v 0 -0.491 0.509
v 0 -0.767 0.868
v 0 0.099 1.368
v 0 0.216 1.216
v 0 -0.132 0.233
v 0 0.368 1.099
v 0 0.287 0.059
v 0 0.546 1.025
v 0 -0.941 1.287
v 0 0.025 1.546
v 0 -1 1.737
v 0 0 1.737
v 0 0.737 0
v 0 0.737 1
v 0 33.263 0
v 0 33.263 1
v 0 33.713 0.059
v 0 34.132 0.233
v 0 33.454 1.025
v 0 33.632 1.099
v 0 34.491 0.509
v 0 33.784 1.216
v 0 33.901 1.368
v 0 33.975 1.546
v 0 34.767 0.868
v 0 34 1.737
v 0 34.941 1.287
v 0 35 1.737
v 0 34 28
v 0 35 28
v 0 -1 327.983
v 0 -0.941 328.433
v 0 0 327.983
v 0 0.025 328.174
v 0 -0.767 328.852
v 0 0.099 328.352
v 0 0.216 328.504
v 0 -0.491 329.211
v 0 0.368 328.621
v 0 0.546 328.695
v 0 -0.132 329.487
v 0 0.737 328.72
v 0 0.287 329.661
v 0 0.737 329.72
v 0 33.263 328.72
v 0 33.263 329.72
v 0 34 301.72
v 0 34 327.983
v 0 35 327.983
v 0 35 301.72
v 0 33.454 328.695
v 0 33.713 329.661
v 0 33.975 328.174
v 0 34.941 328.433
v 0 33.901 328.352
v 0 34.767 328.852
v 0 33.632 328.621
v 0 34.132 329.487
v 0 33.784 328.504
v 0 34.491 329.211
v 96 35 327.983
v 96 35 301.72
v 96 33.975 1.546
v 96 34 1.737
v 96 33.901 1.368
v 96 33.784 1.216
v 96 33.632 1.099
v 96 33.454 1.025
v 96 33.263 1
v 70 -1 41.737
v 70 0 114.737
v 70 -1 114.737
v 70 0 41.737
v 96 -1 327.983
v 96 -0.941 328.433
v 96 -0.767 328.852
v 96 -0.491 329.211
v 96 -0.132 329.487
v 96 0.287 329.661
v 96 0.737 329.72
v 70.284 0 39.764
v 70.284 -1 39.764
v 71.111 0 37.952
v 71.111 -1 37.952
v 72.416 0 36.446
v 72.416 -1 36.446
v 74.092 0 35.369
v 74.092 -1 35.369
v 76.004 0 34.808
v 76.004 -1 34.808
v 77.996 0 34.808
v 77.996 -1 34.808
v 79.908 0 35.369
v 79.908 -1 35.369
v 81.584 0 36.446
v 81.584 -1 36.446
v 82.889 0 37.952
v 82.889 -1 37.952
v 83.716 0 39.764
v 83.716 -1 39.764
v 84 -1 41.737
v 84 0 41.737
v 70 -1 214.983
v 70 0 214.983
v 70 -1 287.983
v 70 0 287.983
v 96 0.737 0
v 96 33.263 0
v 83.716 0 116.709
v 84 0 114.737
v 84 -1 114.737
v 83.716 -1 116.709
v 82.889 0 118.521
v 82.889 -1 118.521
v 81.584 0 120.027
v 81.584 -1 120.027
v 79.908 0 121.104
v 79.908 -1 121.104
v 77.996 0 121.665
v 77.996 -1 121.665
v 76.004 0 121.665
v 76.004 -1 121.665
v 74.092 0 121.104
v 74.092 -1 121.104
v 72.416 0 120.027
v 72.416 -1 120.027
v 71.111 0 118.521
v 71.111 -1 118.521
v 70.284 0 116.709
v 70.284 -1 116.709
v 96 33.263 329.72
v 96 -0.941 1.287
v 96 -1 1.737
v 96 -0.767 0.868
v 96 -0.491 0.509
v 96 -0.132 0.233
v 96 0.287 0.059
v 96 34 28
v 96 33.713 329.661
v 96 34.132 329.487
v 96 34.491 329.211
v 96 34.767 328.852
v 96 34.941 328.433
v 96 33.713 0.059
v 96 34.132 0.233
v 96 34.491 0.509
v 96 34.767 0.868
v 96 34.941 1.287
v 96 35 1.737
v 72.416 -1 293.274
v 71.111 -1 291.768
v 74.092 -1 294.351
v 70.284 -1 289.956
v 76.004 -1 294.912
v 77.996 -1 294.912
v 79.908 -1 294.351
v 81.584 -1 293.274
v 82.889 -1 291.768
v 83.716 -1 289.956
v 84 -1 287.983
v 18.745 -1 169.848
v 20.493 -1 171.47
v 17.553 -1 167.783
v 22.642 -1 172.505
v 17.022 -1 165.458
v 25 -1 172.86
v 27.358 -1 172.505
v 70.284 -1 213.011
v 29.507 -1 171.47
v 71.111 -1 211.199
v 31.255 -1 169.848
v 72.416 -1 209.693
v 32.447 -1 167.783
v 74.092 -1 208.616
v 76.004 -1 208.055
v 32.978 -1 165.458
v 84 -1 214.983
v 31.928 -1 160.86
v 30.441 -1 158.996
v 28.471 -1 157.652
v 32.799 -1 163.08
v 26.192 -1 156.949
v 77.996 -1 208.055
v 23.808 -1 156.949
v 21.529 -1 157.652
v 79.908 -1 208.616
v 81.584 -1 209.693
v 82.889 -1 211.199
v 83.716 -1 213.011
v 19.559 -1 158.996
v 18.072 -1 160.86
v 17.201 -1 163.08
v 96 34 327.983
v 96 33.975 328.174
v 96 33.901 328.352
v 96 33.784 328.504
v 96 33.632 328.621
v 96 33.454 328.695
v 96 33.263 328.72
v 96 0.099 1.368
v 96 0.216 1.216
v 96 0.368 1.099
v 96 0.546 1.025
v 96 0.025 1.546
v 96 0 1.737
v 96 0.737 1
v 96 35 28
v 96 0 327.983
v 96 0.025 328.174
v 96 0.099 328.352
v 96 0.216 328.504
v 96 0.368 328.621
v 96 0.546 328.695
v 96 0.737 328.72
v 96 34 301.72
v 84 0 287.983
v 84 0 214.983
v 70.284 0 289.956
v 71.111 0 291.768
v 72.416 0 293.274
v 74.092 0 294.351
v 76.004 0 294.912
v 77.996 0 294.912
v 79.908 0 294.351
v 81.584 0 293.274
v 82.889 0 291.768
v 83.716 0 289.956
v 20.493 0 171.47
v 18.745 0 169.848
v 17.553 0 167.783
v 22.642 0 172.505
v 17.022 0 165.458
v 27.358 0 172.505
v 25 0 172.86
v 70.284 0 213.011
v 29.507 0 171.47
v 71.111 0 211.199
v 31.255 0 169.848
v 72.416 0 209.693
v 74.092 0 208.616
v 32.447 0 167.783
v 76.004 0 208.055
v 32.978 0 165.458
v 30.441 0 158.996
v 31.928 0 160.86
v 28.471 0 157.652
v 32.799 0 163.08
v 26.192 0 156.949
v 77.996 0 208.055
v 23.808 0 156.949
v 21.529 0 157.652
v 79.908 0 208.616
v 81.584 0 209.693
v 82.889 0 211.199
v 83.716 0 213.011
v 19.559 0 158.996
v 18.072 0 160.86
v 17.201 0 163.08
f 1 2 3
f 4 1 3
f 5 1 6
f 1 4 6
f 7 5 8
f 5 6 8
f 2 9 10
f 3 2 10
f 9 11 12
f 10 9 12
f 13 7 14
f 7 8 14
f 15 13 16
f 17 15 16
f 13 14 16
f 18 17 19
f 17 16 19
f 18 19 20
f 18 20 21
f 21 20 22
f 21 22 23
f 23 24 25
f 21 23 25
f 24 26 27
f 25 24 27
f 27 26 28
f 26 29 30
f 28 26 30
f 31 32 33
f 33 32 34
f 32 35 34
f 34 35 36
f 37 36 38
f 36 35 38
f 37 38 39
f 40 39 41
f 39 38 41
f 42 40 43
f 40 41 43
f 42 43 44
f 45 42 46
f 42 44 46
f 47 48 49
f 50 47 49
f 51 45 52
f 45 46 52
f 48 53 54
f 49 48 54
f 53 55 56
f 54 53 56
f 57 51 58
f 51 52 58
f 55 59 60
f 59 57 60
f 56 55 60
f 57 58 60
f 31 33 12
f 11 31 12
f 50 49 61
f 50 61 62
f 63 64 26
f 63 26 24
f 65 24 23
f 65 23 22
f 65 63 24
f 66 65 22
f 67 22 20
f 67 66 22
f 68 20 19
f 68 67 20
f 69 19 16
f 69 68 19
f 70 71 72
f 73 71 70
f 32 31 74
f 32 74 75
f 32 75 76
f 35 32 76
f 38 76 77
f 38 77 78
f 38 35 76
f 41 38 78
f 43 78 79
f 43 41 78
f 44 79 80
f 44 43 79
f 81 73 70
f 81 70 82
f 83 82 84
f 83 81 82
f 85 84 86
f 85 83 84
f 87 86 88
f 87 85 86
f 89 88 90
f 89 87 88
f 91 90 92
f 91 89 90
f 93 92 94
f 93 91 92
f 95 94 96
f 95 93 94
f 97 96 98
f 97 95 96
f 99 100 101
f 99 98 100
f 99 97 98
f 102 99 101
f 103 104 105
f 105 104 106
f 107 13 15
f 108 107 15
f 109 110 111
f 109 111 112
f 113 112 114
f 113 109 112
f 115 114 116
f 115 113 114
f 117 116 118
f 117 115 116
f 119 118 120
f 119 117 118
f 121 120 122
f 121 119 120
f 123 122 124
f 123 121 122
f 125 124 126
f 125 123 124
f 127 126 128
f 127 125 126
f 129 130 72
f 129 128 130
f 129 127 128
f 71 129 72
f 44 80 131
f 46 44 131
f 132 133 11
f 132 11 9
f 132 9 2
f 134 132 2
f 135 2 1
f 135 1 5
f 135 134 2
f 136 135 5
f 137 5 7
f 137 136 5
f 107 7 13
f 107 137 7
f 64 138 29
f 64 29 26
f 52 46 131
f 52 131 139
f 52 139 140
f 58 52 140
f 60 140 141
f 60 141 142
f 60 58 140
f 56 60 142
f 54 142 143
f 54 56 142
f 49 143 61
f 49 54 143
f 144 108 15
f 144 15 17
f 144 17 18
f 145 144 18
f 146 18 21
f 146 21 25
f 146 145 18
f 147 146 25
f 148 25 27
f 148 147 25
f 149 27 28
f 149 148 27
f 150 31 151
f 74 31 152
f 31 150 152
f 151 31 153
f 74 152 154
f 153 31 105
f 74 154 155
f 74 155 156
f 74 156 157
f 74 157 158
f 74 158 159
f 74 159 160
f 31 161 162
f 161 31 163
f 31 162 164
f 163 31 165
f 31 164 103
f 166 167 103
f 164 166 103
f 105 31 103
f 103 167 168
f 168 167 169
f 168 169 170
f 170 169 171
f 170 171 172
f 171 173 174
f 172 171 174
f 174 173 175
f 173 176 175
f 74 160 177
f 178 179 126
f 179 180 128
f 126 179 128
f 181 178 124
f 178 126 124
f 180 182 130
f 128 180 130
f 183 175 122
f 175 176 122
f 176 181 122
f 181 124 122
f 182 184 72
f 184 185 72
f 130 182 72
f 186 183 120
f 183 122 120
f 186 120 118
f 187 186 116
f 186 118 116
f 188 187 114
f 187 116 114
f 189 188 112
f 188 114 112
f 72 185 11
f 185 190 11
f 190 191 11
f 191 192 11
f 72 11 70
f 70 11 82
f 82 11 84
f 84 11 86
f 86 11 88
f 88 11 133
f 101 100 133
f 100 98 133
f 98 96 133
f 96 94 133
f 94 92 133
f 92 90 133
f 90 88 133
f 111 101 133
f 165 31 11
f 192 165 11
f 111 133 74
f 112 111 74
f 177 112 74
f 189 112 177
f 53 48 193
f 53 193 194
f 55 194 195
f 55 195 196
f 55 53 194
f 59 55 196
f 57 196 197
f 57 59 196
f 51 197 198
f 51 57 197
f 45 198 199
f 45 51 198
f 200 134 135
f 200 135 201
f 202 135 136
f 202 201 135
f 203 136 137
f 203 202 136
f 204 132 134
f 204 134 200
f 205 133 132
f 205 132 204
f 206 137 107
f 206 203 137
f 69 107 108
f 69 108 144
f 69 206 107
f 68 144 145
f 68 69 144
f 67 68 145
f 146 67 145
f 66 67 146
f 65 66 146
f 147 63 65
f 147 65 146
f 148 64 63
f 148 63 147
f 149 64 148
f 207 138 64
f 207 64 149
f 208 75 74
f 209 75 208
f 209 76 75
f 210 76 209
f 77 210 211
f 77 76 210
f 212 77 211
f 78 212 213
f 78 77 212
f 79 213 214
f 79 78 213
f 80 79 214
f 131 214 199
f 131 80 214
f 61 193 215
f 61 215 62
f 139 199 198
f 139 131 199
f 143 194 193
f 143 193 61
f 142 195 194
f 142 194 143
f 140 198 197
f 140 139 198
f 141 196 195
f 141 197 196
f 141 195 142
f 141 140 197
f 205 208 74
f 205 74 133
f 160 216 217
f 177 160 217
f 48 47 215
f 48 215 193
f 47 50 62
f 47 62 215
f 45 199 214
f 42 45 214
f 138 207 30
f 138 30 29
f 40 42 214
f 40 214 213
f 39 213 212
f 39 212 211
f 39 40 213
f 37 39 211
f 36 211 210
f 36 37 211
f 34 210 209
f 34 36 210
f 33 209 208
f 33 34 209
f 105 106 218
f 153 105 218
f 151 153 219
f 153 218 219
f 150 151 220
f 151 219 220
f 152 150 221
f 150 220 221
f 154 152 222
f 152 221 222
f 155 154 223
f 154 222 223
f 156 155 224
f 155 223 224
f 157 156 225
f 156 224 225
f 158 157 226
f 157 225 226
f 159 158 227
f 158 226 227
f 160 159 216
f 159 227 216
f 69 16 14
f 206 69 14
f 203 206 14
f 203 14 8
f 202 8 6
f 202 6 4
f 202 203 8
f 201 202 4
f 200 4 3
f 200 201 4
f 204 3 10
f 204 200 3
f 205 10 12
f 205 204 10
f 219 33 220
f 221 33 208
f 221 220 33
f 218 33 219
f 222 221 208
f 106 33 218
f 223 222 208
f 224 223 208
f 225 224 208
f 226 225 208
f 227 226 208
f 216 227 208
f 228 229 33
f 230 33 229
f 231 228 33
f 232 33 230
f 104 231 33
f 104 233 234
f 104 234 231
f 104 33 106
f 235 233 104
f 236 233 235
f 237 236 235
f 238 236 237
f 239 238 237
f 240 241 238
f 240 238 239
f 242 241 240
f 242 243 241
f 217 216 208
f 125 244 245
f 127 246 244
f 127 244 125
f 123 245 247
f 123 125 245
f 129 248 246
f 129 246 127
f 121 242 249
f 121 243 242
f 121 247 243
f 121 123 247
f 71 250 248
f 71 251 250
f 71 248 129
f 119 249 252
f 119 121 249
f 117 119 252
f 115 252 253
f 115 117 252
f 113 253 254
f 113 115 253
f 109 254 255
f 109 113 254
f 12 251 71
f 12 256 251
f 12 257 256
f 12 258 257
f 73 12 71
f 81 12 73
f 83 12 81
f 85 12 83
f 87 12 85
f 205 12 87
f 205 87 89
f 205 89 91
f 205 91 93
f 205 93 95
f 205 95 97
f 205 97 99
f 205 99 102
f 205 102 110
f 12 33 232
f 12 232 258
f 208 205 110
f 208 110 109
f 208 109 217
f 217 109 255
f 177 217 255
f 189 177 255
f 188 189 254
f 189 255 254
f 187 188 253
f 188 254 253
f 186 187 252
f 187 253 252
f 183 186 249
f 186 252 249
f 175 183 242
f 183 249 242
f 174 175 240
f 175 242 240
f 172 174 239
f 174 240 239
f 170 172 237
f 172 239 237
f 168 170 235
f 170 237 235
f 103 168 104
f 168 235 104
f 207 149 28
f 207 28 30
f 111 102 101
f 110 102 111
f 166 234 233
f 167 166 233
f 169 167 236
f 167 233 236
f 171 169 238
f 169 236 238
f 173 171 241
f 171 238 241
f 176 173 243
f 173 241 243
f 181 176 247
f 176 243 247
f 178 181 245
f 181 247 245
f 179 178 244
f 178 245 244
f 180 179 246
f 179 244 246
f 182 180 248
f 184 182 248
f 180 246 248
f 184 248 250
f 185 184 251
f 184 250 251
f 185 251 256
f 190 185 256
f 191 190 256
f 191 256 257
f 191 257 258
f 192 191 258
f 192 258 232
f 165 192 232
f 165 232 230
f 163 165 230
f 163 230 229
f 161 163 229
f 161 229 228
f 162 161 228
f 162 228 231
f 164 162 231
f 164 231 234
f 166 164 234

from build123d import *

# Parameters (mm, degrees)
SKETCH1_W                    = 96
SKETCH1_H                    = 1
BASE_FLANGE1_DEPTH           = 329.72
EDGE_FLANGE1_STRIP_W         = 5.4732
EDGE_FLANGE1_STRIP_H         = 1
EDGE_FLANGE1_STRIP_CUT_DEPTH = 96
EDGE_FLANGE1_DEPTH           = 96
EDGE_FLANGE2_STRIP_W         = 5.4732
EDGE_FLANGE2_STRIP_H         = 1
EDGE_FLANGE2_STRIP_CUT_DEPTH = 96
EDGE_FLANGE2_DEPTH           = 96
EDGE_FLANGE3_STRIP_W         = 5.4732
EDGE_FLANGE3_STRIP_H         = 1
EDGE_FLANGE3_STRIP_CUT_DEPTH = 96
EDGE_FLANGE3_DEPTH           = 96
EDGE_FLANGE4_STRIP_W         = 5.4732
EDGE_FLANGE4_STRIP_H         = 1
EDGE_FLANGE4_STRIP_CUT_DEPTH = 96
EDGE_FLANGE4_DEPTH           = 96
CUT_EXTRUDE1_DEPTH           = 10
SKETCH23_R                   = 8
CUT_EXTRUDE4_DEPTH           = 10


# Sheet-metal steps are written as plain solids
with BuildPart() as part:
    # Sketch1 → Base-Flange1 (new body)
    with BuildSketch(Plane.XY):
        with Locations((48, -0.5)):
            Rectangle(SKETCH1_W, SKETCH1_H)
    extrude(amount=BASE_FLANGE1_DEPTH)

    # Edge-Flange1 strip (across the edge) → Edge-Flange1 strip cut (cut)
    with BuildSketch(Plane(origin=(0, 0, 329.72), x_dir=(0, 0, -1), z_dir=(1, 0, 0))):
        with Locations((-1, -0.5)):
            Rectangle(EDGE_FLANGE1_STRIP_W, EDGE_FLANGE1_STRIP_H)
    extrude(amount=EDGE_FLANGE1_STRIP_CUT_DEPTH, mode=Mode.SUBTRACT)

    # Edge-Flange1 section (across the edge) → Edge-Flange1 (add)
    with BuildSketch(Plane(origin=(0, 0, 329.72), x_dir=(0, 0, -1), z_dir=(1, 0, 0))):
        with BuildLine():
            Line((0, 0.7366), (0, 35))
            Line((0, 35), (1, 35))
            Line((1, 35), (1, 0.7366))
            ThreePointArc((1, 0.7366), (1.215745145, 0.215745145), (1.7366, 0))
            Line((1.7366, 0), (1.7366, -1))
            ThreePointArc((1.7366, -1), (0.508638364, -0.491361636), (0, 0.7366))
        make_face()
    extrude(amount=EDGE_FLANGE1_DEPTH)

    # Edge-Flange2 strip (across the edge) → Edge-Flange2 strip cut (cut)
    with BuildSketch(Plane.ZY.offset(-96)):
        with Locations((-1, -0.5)):
            Rectangle(EDGE_FLANGE2_STRIP_W, EDGE_FLANGE2_STRIP_H)
    extrude(amount=EDGE_FLANGE2_STRIP_CUT_DEPTH, mode=Mode.SUBTRACT)

    # Edge-Flange2 section (across the edge) → Edge-Flange2 (add)
    with BuildSketch(Plane.ZY.offset(-96)):
        with BuildLine():
            Line((0, 0.7366), (0, 35))
            Line((0, 35), (1, 35))
            Line((1, 35), (1, 0.7366))
            ThreePointArc((1, 0.7366), (1.215745145, 0.215745145), (1.7366, 0))
            Line((1.7366, 0), (1.7366, -1))
            ThreePointArc((1.7366, -1), (0.508638364, -0.491361636), (0, 0.7366))
        make_face()
    extrude(amount=EDGE_FLANGE2_DEPTH)

    # Edge-Flange3 strip (across the edge) → Edge-Flange3 strip cut (cut)
    with BuildSketch(Plane(origin=(0, 35, 328.72), x_dir=(0, -1, 0), z_dir=(1, 0, 0))):
        with Locations((-1, -0.5)):
            Rectangle(EDGE_FLANGE3_STRIP_W, EDGE_FLANGE3_STRIP_H)
    extrude(amount=EDGE_FLANGE3_STRIP_CUT_DEPTH, mode=Mode.SUBTRACT)

    # Edge-Flange3 section (across the edge) → Edge-Flange3 (add)
    with BuildSketch(Plane(origin=(0, 35, 328.72), x_dir=(0, -1, 0), z_dir=(1, 0, 0))):
        with BuildLine():
            Line((0, 0.7366), (0, 27))
            Line((0, 27), (1, 27))
            Line((1, 27), (1, 0.7366))
            ThreePointArc((1, 0.7366), (1.215745145, 0.215745145), (1.7366, 0))
            Line((1.7366, 0), (1.7366, -1))
            ThreePointArc((1.7366, -1), (0.508638364, -0.491361636), (0, 0.7366))
        make_face()
    extrude(amount=EDGE_FLANGE3_DEPTH)

    # Edge-Flange4 strip (across the edge) → Edge-Flange4 strip cut (cut)
    with BuildSketch(Plane(origin=(96, 35, 1), x_dir=(0, -1, 0), z_dir=(-1, 0, 0))):
        with Locations((-1, -0.5)):
            Rectangle(EDGE_FLANGE4_STRIP_W, EDGE_FLANGE4_STRIP_H)
    extrude(amount=EDGE_FLANGE4_STRIP_CUT_DEPTH, mode=Mode.SUBTRACT)

    # Edge-Flange4 section (across the edge) → Edge-Flange4 (add)
    with BuildSketch(Plane(origin=(96, 35, 1), x_dir=(0, -1, 0), z_dir=(-1, 0, 0))):
        with BuildLine():
            Line((0, 0.7366), (0, 27))
            Line((0, 27), (1, 27))
            Line((1, 27), (1, 0.7366))
            ThreePointArc((1, 0.7366), (1.215745145, 0.215745145), (1.7366, 0))
            Line((1.7366, 0), (1.7366, -1))
            ThreePointArc((1.7366, -1), (0.508638364, -0.491361636), (0, 0.7366))
        make_face()
    extrude(amount=EDGE_FLANGE4_DEPTH)

    # Sketch22 → Cut-Extrude1 (cut)
    with BuildSketch(Plane(origin=(0, 0, 0), x_dir=(1, 0, 0), z_dir=(0, 1, 0))):
        with BuildLine():
            Line((70, -214.9834), (70, -287.9834))
            ThreePointArc((70, -287.9834), (77, -294.9834), (84, -287.9834))
            Line((84, -287.9834), (84, -214.9834))
            ThreePointArc((84, -214.9834), (77, -207.9834), (70, -214.9834))
        make_face()
        with BuildLine():
            Line((70, -114.7366), (70, -41.7366))
            ThreePointArc((70, -41.7366), (77, -34.7366), (84, -41.7366))
            Line((84, -41.7366), (84, -114.7366))
            ThreePointArc((84, -114.7366), (77, -121.7366), (70, -114.7366))
        make_face()
    extrude(amount=-CUT_EXTRUDE1_DEPTH, mode=Mode.SUBTRACT)

    # Sketch23 → Cut-Extrude4 (cut)
    with BuildSketch(Plane(origin=(0, 0, 0), x_dir=(1, 0, 0), z_dir=(0, 1, 0))):
        with Locations(Location((25, -164.86, 0), (0, 0, 270))):
            Circle(SKETCH23_R)
    extrude(amount=-CUT_EXTRUDE4_DEPTH, mode=Mode.SUBTRACT)


solid = part.part
